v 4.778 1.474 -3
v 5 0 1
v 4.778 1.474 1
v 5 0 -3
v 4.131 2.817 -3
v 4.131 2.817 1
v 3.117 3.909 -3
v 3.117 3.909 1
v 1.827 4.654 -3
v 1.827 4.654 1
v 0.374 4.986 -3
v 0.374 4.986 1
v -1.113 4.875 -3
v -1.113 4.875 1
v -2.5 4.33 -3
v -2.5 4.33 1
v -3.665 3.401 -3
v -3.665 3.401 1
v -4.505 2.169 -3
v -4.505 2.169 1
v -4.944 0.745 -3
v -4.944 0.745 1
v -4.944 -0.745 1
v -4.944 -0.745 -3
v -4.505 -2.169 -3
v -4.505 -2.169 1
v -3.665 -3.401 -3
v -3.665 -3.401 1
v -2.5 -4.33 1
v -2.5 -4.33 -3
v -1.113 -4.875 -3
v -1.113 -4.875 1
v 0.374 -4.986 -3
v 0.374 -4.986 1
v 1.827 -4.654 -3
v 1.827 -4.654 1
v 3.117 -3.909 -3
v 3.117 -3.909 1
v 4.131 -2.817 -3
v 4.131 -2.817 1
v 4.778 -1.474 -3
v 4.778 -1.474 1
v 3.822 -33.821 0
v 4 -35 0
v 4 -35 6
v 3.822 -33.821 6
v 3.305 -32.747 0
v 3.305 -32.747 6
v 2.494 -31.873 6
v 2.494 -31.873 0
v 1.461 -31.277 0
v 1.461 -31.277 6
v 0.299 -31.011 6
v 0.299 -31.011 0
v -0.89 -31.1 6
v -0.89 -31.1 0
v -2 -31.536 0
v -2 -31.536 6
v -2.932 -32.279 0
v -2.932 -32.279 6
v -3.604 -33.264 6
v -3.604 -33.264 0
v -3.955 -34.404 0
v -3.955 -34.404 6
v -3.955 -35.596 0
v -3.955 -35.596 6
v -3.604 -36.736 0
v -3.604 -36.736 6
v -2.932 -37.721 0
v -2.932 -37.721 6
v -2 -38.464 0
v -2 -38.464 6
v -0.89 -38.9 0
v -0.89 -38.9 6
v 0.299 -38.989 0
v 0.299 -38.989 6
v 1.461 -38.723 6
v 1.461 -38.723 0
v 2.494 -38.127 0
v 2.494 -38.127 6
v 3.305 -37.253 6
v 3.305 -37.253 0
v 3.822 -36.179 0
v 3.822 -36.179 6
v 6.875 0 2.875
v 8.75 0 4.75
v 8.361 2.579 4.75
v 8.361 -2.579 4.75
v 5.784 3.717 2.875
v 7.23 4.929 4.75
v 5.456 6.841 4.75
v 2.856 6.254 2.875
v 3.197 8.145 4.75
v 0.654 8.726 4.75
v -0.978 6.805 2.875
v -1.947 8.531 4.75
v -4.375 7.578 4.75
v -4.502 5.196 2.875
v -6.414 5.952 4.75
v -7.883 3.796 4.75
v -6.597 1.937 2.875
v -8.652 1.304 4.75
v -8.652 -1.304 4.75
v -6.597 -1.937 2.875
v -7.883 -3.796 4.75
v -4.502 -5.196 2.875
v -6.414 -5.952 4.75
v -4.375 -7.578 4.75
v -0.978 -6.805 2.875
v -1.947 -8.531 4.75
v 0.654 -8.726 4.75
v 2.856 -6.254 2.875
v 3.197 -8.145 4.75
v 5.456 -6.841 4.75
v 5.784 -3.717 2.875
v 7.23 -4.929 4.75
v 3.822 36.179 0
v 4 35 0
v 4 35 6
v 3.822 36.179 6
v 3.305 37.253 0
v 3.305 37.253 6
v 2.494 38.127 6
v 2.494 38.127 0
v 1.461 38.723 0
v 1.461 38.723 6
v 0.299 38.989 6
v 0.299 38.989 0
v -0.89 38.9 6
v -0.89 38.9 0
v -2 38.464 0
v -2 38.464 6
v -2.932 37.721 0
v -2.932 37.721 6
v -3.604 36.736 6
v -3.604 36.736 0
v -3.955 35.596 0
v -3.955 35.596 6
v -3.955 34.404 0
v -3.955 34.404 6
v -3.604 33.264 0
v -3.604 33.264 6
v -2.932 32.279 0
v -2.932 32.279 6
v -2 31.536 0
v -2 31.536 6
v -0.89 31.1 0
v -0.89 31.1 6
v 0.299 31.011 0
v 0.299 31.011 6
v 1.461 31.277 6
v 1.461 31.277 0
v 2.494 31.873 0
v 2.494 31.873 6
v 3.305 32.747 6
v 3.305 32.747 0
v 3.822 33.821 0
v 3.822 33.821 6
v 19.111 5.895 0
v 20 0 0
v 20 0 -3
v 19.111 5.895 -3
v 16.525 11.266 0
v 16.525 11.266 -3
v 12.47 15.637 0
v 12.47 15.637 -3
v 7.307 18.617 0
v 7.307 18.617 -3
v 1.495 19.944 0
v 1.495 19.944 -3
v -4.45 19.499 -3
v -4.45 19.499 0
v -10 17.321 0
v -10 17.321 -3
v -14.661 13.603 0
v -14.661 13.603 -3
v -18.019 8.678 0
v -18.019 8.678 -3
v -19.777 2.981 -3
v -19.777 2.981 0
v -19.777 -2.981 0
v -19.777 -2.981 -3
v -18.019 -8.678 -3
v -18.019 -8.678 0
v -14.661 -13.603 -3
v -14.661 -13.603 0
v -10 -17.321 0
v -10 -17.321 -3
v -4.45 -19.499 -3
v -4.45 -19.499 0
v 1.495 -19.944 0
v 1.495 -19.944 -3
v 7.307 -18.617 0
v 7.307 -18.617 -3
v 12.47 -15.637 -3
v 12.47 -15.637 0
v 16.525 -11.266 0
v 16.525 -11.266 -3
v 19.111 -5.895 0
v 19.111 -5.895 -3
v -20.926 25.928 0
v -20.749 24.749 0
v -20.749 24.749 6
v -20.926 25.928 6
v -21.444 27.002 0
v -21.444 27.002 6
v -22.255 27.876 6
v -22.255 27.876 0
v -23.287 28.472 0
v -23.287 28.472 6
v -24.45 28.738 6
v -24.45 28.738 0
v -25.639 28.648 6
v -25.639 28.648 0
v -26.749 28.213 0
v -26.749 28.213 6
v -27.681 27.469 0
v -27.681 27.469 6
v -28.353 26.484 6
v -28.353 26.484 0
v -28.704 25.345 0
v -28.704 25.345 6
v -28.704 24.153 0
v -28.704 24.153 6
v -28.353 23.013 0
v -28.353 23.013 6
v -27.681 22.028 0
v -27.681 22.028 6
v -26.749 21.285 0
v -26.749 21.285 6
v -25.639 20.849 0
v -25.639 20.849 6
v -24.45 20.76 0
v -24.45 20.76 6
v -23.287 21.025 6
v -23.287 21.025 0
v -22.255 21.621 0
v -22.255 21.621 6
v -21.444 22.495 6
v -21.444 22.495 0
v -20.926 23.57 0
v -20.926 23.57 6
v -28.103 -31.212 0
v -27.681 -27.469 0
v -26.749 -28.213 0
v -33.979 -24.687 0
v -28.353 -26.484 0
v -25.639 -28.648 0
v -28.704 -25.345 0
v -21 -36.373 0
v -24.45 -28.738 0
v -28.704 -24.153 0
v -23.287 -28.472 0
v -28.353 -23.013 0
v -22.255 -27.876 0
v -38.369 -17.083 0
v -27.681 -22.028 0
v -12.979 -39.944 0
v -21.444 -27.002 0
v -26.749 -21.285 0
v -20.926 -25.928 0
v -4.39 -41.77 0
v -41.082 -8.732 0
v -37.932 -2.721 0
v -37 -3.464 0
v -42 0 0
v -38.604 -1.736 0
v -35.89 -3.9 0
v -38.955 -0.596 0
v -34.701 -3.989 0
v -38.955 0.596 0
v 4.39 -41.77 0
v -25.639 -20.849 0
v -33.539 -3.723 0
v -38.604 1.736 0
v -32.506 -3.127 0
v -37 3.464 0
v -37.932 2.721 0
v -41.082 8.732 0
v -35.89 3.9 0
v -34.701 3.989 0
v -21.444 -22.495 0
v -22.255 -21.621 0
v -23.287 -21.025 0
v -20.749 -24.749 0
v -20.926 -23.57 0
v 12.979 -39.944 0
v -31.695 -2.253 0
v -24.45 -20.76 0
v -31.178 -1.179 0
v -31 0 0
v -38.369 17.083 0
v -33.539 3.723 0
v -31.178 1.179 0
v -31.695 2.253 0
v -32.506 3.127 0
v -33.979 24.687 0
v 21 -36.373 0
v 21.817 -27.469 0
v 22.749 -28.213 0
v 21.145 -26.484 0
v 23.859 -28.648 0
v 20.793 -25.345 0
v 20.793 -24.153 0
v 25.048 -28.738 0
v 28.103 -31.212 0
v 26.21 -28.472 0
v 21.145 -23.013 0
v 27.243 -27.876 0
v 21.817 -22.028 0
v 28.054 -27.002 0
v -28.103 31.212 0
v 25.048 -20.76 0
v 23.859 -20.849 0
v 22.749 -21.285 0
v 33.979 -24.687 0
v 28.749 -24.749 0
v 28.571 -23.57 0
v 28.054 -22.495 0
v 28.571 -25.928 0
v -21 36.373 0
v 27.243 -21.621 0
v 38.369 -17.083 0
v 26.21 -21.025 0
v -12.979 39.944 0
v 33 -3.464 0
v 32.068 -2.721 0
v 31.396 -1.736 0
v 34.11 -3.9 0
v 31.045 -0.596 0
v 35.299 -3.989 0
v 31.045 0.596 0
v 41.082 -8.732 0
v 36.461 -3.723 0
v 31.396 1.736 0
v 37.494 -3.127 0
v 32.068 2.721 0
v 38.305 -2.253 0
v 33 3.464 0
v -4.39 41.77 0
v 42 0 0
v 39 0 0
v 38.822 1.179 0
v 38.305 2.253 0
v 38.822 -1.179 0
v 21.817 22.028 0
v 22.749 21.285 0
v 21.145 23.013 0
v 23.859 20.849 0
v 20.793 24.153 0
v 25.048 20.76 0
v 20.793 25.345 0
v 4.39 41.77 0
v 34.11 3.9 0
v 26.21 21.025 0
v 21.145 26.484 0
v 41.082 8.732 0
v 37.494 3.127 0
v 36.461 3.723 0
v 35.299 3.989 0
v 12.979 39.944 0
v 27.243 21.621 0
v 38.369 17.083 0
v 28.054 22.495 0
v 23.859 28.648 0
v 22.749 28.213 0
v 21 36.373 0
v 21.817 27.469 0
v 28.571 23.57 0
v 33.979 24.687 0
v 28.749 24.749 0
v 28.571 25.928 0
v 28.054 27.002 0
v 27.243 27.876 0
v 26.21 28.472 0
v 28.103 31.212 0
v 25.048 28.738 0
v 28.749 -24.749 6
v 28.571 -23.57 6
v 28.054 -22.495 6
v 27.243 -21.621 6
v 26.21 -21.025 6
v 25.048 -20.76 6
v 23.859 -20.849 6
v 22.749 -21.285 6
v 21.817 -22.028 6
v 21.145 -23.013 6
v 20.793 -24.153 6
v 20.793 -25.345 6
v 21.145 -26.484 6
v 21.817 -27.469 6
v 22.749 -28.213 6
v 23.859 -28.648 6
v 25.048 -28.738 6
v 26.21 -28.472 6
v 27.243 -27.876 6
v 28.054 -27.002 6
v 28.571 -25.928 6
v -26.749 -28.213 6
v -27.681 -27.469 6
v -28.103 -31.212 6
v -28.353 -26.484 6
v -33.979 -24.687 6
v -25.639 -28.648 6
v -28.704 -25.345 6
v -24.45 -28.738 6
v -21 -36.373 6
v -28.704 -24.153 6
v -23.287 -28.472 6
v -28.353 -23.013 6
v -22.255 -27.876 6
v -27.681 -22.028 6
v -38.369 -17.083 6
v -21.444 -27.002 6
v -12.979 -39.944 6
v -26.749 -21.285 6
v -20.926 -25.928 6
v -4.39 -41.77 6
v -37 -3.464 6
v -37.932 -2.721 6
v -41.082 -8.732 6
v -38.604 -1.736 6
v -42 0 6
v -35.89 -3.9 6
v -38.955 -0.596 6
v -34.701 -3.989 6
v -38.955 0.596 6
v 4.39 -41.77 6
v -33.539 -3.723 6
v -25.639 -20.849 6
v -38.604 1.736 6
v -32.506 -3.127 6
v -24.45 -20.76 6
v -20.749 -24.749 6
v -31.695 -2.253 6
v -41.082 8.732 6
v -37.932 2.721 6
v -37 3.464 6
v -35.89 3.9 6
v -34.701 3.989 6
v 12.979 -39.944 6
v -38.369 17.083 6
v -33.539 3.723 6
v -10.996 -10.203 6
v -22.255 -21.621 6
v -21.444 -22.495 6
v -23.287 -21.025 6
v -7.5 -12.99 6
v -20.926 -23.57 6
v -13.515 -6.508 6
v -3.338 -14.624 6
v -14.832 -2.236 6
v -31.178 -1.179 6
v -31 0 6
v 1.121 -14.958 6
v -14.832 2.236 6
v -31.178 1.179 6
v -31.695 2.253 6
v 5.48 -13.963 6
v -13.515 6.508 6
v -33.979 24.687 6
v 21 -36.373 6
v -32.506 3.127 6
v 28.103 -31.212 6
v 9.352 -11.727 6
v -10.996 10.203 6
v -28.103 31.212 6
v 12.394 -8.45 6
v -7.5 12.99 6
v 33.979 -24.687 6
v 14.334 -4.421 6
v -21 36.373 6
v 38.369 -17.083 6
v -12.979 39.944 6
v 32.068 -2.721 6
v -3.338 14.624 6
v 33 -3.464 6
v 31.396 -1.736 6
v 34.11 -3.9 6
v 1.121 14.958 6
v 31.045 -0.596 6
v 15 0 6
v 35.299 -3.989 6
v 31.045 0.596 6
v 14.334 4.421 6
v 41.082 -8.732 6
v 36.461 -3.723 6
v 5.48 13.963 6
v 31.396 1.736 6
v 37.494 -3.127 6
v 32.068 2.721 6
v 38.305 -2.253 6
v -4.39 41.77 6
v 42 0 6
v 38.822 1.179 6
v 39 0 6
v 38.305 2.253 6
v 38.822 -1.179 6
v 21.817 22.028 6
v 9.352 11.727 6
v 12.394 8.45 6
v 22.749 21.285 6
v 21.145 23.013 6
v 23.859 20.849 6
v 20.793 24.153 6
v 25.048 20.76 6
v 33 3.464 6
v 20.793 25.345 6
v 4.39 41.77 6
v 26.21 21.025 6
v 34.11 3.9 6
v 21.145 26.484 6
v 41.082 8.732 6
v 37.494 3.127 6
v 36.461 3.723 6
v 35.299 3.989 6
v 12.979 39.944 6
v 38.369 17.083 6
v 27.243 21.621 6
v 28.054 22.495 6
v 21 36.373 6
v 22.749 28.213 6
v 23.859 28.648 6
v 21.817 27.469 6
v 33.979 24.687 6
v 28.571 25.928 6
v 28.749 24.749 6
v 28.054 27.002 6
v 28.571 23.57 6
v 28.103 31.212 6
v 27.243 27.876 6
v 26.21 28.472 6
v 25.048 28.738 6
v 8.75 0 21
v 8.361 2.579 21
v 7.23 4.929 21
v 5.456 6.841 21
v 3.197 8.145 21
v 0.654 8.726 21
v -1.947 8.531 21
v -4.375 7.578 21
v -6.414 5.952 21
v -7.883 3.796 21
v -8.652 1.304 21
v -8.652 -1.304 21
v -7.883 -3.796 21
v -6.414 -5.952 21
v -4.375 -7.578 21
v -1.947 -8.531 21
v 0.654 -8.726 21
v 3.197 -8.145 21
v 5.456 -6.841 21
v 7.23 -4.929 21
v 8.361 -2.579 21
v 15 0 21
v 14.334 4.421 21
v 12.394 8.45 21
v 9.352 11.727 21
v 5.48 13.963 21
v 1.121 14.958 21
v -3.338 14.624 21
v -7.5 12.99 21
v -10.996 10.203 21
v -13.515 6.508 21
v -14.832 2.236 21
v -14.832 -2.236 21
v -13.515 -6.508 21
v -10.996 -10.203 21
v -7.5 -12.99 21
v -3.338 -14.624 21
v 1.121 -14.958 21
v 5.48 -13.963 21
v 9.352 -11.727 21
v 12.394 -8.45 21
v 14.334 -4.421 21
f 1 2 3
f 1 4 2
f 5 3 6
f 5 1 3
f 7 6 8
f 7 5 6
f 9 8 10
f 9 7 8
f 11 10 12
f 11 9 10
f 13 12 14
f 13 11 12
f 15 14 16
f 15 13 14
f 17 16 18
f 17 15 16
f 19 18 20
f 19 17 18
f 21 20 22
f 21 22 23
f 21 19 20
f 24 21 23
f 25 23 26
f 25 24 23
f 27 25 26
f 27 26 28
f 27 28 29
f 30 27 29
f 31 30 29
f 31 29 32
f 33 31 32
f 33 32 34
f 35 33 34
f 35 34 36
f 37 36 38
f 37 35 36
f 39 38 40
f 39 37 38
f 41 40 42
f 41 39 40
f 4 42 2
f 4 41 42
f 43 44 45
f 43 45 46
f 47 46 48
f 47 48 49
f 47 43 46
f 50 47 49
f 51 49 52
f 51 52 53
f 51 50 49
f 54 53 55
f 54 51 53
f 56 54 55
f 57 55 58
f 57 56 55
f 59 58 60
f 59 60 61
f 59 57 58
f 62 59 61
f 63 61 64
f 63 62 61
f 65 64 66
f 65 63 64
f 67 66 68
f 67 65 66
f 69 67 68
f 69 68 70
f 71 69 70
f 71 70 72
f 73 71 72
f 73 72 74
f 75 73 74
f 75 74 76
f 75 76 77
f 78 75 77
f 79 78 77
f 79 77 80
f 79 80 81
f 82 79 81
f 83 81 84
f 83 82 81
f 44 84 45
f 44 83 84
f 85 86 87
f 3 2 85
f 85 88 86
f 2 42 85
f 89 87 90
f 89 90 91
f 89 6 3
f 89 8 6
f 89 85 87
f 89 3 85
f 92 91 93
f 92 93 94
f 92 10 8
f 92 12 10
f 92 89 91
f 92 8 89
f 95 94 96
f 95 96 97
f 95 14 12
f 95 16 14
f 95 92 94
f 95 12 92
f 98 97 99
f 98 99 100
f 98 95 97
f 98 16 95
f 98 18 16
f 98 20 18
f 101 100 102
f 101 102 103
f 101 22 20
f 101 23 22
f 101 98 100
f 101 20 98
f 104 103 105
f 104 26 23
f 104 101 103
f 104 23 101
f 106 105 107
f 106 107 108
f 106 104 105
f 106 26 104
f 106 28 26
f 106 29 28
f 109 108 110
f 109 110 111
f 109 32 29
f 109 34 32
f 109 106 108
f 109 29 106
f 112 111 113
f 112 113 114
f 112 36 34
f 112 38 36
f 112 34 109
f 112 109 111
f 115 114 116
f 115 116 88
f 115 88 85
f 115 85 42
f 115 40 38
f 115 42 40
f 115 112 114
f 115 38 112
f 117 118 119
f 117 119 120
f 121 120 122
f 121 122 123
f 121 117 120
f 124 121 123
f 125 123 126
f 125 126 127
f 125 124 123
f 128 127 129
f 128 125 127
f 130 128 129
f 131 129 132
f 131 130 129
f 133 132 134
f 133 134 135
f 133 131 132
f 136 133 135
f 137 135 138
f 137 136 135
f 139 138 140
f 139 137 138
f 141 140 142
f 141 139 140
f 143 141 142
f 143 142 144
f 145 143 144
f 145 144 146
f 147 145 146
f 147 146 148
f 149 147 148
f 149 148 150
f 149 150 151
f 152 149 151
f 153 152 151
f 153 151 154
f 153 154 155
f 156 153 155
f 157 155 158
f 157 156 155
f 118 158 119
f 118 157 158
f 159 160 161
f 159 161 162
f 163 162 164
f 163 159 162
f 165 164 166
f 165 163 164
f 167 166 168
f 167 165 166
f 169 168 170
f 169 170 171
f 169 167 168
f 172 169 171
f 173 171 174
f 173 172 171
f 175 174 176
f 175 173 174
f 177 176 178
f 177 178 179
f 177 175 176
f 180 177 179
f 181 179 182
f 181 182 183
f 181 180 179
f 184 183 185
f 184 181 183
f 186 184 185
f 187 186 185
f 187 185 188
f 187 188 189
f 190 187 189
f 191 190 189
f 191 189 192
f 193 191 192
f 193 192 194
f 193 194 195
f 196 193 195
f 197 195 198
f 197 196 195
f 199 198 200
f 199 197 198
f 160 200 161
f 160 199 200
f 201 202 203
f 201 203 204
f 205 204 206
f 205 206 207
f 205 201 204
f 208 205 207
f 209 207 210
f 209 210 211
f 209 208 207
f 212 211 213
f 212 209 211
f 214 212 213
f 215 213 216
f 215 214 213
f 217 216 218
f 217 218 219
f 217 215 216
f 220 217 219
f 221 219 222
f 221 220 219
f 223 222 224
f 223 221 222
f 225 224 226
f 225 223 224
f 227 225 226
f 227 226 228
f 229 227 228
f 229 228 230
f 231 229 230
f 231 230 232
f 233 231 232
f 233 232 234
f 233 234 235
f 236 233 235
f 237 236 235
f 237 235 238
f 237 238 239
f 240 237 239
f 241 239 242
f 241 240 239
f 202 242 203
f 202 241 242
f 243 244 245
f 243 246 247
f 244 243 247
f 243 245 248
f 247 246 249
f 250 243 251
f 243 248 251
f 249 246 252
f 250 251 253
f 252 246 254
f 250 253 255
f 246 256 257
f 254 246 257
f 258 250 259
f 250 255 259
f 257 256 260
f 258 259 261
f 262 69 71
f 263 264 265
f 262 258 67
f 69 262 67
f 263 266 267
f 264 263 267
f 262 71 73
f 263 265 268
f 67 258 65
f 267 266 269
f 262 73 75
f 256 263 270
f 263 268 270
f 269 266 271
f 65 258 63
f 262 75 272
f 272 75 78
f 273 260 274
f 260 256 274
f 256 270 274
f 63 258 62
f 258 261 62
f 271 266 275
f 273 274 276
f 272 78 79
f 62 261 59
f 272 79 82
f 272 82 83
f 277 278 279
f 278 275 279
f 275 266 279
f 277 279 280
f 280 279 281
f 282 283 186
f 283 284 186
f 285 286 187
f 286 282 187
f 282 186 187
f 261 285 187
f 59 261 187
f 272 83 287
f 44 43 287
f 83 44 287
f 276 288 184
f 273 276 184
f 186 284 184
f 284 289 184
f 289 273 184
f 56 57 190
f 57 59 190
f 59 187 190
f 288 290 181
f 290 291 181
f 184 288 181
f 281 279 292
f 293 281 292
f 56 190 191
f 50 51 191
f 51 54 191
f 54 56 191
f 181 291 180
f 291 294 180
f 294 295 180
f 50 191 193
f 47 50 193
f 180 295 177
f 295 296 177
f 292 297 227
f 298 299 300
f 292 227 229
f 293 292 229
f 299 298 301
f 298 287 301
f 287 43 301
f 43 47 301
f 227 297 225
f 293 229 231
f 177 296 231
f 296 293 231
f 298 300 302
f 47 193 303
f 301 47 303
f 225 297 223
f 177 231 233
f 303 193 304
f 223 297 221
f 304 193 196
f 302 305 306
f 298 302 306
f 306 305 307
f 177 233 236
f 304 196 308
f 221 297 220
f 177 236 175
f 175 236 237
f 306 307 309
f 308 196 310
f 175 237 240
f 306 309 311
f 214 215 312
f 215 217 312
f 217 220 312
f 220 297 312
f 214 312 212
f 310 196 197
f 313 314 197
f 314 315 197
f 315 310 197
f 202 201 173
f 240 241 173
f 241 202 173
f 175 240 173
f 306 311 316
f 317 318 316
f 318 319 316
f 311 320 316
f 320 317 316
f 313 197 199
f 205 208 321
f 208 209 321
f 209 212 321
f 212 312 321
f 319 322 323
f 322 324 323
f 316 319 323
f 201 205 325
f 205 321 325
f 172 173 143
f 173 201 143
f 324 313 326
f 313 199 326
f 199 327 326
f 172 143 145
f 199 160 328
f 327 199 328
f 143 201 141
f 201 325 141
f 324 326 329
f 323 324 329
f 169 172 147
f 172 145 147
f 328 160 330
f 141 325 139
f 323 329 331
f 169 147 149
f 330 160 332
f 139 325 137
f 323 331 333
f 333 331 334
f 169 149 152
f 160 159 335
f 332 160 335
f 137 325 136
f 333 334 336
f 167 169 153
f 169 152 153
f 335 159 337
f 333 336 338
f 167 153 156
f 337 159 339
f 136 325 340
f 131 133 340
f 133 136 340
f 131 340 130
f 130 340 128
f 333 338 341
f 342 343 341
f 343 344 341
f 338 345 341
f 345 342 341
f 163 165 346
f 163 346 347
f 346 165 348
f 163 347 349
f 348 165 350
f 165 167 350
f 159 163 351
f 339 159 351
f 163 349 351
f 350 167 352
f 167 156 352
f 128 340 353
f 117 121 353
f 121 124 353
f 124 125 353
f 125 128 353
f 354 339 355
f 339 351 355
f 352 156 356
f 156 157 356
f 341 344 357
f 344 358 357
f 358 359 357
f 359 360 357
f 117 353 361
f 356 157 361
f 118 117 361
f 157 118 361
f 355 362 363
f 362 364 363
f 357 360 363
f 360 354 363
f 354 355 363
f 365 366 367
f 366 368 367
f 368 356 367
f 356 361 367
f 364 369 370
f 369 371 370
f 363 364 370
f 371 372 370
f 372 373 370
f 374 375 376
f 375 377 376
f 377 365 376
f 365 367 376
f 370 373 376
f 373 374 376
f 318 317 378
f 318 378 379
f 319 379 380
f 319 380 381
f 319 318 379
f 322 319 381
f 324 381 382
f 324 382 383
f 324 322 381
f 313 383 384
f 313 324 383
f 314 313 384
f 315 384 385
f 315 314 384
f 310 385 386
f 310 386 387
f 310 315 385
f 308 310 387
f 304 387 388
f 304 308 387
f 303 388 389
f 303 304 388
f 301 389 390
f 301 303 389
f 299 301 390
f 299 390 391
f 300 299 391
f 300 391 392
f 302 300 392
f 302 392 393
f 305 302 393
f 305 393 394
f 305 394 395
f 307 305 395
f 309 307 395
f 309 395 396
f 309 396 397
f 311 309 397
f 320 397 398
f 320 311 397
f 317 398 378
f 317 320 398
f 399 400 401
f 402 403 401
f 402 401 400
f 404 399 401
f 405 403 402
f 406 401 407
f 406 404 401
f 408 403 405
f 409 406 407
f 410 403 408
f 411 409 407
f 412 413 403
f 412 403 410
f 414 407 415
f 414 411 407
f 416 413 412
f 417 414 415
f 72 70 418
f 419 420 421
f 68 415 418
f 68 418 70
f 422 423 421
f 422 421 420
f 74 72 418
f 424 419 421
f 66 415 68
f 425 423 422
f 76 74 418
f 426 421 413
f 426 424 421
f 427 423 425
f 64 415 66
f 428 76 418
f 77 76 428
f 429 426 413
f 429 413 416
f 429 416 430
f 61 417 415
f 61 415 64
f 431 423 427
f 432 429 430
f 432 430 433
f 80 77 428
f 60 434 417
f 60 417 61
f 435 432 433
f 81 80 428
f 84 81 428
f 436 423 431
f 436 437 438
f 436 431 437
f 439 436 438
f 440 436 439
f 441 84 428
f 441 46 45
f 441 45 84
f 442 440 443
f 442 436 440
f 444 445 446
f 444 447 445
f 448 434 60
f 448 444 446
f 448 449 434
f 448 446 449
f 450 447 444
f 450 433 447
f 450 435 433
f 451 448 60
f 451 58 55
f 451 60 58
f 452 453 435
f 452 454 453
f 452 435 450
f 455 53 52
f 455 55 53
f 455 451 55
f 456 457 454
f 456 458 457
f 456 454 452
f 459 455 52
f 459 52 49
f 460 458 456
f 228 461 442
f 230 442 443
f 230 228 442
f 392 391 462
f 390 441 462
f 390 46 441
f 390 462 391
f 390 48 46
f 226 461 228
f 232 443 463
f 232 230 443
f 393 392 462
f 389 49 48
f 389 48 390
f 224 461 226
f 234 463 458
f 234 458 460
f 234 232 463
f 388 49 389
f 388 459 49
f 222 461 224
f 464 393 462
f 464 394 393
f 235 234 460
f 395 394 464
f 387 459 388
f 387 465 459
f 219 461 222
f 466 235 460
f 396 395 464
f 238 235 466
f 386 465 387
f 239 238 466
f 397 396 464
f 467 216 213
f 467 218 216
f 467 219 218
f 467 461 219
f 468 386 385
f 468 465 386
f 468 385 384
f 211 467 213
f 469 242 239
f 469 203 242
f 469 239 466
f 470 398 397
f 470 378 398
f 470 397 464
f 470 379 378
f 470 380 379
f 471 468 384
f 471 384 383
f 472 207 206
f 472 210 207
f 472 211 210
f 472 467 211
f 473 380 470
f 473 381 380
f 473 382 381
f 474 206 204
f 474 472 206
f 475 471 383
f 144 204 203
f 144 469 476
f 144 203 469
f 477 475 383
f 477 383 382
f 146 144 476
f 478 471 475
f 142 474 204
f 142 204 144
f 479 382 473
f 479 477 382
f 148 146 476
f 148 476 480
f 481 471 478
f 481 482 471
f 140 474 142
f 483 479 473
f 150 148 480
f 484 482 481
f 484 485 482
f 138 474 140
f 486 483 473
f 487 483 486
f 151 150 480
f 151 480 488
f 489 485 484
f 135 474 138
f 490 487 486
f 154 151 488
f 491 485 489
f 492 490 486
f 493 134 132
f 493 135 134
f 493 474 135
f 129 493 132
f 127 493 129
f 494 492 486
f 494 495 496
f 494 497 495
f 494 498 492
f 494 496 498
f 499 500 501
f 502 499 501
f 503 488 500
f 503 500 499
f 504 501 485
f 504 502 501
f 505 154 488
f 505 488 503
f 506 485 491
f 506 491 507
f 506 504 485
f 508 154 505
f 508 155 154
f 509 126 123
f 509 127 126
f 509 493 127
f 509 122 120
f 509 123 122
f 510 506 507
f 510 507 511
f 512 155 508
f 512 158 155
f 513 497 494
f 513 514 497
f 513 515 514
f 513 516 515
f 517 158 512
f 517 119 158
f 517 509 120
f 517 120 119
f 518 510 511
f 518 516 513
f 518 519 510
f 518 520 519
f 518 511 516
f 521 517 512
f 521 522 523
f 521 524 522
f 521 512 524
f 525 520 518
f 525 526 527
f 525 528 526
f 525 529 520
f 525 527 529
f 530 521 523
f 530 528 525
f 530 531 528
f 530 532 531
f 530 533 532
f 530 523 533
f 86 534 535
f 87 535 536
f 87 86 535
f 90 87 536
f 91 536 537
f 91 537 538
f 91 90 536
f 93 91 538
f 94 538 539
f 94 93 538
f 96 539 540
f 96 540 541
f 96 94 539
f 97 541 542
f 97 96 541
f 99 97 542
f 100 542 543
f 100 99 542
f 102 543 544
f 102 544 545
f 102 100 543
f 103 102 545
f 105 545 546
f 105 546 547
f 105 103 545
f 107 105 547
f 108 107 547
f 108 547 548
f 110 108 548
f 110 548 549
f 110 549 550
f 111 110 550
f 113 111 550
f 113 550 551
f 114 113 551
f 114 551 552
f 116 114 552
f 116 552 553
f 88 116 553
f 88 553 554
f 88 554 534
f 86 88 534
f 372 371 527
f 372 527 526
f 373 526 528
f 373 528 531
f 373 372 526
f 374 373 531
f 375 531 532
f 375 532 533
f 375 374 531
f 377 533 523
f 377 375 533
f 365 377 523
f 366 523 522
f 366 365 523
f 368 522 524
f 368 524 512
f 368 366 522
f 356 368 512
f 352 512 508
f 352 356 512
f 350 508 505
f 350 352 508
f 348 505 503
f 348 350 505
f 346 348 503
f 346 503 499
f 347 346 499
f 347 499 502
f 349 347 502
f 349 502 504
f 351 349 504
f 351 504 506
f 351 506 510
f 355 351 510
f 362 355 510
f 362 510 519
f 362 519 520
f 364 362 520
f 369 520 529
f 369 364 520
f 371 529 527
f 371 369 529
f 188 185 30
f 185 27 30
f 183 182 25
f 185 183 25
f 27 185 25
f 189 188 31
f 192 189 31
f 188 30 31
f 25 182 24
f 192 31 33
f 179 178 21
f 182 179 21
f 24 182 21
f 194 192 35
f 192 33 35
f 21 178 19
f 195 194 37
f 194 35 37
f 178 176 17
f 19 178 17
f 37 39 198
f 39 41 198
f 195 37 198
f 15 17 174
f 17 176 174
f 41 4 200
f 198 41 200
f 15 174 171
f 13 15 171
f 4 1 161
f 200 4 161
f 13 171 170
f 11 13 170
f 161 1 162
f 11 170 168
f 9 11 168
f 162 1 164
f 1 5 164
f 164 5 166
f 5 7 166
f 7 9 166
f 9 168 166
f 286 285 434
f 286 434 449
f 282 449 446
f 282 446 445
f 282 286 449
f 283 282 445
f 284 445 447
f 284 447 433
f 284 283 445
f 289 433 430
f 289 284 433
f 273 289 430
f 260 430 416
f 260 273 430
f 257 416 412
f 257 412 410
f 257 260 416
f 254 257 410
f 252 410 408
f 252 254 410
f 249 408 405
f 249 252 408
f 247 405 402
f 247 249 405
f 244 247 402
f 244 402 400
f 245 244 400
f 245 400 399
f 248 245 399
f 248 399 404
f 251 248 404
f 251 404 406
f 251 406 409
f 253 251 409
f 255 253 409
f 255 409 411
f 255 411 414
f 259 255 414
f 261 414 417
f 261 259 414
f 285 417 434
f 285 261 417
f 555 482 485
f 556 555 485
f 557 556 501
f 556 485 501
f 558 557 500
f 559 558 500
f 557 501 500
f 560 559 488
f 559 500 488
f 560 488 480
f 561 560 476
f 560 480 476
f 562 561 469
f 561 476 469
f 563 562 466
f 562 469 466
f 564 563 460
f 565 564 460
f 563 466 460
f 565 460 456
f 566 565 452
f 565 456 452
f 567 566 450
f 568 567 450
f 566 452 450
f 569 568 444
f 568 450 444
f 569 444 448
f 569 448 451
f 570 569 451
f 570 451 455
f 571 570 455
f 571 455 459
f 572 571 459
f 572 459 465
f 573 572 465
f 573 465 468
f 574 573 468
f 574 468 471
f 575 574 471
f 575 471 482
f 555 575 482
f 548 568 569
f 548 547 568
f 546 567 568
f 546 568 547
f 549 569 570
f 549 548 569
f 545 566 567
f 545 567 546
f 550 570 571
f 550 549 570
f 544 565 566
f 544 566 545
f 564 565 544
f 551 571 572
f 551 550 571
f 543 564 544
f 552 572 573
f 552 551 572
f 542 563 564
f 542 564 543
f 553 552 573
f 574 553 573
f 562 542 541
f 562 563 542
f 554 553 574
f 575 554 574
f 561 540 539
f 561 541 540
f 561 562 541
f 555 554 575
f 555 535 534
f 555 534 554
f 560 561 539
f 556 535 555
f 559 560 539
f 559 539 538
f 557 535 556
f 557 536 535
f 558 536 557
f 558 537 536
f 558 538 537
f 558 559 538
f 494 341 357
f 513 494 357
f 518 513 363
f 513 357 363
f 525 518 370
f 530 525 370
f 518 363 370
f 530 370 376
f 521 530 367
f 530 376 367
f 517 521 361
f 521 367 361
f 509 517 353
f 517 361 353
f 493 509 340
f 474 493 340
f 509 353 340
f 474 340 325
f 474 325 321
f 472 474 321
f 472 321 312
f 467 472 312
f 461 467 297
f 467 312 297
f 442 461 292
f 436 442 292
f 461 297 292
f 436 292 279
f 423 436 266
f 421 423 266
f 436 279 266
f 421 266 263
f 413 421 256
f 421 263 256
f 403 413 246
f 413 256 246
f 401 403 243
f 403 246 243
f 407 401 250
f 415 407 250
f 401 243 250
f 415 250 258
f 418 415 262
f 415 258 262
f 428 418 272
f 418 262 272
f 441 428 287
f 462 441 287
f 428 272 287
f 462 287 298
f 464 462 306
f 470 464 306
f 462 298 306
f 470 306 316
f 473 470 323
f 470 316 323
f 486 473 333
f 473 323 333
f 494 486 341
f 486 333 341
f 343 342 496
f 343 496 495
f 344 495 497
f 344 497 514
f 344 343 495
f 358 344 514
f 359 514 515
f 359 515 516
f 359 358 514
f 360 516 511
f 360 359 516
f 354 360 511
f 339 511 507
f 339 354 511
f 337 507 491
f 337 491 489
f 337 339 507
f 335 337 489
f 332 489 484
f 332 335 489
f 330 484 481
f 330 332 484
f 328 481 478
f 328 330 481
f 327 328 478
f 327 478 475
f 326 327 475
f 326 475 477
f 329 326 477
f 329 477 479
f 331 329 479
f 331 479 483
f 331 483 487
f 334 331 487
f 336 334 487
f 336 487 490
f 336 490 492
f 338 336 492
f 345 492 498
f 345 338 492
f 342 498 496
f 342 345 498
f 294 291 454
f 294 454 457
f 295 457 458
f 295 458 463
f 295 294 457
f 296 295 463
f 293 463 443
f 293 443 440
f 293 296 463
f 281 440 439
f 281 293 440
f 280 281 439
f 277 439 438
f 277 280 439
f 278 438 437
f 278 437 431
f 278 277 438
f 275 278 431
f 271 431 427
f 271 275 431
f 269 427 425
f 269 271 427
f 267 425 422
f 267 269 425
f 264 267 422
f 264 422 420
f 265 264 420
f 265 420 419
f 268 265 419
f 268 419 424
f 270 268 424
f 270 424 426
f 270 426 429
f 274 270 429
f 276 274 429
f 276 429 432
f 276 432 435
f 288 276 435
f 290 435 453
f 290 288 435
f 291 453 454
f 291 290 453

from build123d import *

# Parameters (mm, degrees)
F0_R     = 15
F0_R_2   = 8.75
F1_DEPTH = 21
F0_R_3   = 20
F2_DEPTH = 3
F0_R_4   = 42
F0_R_5   = 4
F3_DEPTH = 6
F4_DEPTH = 6
F0_R_6   = 5
F5_DEPTH = 3
F6_DEPTH = 3
F7_DEPTH = 1
F8_SIZE  = 3.74999


# Not quite as in the source:
# - a fillet or chamfer is up to 0.001 mm smaller than in the source, because OpenCascade refuses the exact size


with BuildPart() as f1:
    # F0 (on Top) → F1 (new body)
    with BuildSketch(Plane.XY):
        Circle(F0_R)
        Circle(F0_R_2, mode=Mode.SUBTRACT)
    extrude(amount=F1_DEPTH)

    # F0 (on Top) → F2 (join)
    with BuildSketch(Plane.XY):
        Circle(F0_R_3)
        Circle(F0_R, mode=Mode.SUBTRACT)
    extrude(amount=-F2_DEPTH)

    # F0 (on Top) → F3 (join)
    with BuildSketch(Plane.XY):
        Circle(F0_R_4)
        with Locations((-24.7487373415, -24.7487373415)):
            Circle(F0_R_5, mode=Mode.SUBTRACT)
        with Locations((0, -35)):
            Circle(F0_R_5, mode=Mode.SUBTRACT)
        with Locations((24.7487373415, -24.7487373415)):
            Circle(F0_R_5, mode=Mode.SUBTRACT)
        with Locations((-35, 0)):
            Circle(F0_R_5, mode=Mode.SUBTRACT)
        with Locations((-24.7487373415, 24.7487373415)):
            Circle(F0_R_5, mode=Mode.SUBTRACT)
        Circle(F0_R_3, mode=Mode.SUBTRACT)
        with Locations((35, 0)):
            Circle(F0_R_5, mode=Mode.SUBTRACT)
        with Locations((0, 35)):
            Circle(F0_R_5, mode=Mode.SUBTRACT)
        with Locations((24.7487373415, 24.7487373415)):
            Circle(F0_R_5, mode=Mode.SUBTRACT)
    extrude(amount=F3_DEPTH)

    # F0 (on Top) → F4 (join)
    with BuildSketch(Plane.XY):
        Circle(F0_R_3)
        Circle(F0_R, mode=Mode.SUBTRACT)
    extrude(amount=F4_DEPTH)

    # F0 (on Top) → F5 (join)
    with BuildSketch(Plane.XY):
        Circle(F0_R_2)
        Circle(F0_R_6, mode=Mode.SUBTRACT)
    extrude(amount=-F5_DEPTH)

    # F0 (on Top) → F6 (join)
    with BuildSketch(Plane.XY):
        Circle(F0_R)
        Circle(F0_R_2, mode=Mode.SUBTRACT)
    extrude(amount=-F6_DEPTH)

    # F0 (on Top) → F7 (join)
    with BuildSketch(Plane.XY):
        Circle(F0_R_2)
        Circle(F0_R_6, mode=Mode.SUBTRACT)
    extrude(amount=F7_DEPTH)

    # F8 (size 3.75 in the source; OpenCascade refuses exactly that, so slightly less here)
    f8_edges = [f1.edges().sort_by_distance(p)[0] for p in [
        (-8.75, 0, 1),
    ]]
    chamfer(f8_edges, length=F8_SIZE)


solid = f1.part
